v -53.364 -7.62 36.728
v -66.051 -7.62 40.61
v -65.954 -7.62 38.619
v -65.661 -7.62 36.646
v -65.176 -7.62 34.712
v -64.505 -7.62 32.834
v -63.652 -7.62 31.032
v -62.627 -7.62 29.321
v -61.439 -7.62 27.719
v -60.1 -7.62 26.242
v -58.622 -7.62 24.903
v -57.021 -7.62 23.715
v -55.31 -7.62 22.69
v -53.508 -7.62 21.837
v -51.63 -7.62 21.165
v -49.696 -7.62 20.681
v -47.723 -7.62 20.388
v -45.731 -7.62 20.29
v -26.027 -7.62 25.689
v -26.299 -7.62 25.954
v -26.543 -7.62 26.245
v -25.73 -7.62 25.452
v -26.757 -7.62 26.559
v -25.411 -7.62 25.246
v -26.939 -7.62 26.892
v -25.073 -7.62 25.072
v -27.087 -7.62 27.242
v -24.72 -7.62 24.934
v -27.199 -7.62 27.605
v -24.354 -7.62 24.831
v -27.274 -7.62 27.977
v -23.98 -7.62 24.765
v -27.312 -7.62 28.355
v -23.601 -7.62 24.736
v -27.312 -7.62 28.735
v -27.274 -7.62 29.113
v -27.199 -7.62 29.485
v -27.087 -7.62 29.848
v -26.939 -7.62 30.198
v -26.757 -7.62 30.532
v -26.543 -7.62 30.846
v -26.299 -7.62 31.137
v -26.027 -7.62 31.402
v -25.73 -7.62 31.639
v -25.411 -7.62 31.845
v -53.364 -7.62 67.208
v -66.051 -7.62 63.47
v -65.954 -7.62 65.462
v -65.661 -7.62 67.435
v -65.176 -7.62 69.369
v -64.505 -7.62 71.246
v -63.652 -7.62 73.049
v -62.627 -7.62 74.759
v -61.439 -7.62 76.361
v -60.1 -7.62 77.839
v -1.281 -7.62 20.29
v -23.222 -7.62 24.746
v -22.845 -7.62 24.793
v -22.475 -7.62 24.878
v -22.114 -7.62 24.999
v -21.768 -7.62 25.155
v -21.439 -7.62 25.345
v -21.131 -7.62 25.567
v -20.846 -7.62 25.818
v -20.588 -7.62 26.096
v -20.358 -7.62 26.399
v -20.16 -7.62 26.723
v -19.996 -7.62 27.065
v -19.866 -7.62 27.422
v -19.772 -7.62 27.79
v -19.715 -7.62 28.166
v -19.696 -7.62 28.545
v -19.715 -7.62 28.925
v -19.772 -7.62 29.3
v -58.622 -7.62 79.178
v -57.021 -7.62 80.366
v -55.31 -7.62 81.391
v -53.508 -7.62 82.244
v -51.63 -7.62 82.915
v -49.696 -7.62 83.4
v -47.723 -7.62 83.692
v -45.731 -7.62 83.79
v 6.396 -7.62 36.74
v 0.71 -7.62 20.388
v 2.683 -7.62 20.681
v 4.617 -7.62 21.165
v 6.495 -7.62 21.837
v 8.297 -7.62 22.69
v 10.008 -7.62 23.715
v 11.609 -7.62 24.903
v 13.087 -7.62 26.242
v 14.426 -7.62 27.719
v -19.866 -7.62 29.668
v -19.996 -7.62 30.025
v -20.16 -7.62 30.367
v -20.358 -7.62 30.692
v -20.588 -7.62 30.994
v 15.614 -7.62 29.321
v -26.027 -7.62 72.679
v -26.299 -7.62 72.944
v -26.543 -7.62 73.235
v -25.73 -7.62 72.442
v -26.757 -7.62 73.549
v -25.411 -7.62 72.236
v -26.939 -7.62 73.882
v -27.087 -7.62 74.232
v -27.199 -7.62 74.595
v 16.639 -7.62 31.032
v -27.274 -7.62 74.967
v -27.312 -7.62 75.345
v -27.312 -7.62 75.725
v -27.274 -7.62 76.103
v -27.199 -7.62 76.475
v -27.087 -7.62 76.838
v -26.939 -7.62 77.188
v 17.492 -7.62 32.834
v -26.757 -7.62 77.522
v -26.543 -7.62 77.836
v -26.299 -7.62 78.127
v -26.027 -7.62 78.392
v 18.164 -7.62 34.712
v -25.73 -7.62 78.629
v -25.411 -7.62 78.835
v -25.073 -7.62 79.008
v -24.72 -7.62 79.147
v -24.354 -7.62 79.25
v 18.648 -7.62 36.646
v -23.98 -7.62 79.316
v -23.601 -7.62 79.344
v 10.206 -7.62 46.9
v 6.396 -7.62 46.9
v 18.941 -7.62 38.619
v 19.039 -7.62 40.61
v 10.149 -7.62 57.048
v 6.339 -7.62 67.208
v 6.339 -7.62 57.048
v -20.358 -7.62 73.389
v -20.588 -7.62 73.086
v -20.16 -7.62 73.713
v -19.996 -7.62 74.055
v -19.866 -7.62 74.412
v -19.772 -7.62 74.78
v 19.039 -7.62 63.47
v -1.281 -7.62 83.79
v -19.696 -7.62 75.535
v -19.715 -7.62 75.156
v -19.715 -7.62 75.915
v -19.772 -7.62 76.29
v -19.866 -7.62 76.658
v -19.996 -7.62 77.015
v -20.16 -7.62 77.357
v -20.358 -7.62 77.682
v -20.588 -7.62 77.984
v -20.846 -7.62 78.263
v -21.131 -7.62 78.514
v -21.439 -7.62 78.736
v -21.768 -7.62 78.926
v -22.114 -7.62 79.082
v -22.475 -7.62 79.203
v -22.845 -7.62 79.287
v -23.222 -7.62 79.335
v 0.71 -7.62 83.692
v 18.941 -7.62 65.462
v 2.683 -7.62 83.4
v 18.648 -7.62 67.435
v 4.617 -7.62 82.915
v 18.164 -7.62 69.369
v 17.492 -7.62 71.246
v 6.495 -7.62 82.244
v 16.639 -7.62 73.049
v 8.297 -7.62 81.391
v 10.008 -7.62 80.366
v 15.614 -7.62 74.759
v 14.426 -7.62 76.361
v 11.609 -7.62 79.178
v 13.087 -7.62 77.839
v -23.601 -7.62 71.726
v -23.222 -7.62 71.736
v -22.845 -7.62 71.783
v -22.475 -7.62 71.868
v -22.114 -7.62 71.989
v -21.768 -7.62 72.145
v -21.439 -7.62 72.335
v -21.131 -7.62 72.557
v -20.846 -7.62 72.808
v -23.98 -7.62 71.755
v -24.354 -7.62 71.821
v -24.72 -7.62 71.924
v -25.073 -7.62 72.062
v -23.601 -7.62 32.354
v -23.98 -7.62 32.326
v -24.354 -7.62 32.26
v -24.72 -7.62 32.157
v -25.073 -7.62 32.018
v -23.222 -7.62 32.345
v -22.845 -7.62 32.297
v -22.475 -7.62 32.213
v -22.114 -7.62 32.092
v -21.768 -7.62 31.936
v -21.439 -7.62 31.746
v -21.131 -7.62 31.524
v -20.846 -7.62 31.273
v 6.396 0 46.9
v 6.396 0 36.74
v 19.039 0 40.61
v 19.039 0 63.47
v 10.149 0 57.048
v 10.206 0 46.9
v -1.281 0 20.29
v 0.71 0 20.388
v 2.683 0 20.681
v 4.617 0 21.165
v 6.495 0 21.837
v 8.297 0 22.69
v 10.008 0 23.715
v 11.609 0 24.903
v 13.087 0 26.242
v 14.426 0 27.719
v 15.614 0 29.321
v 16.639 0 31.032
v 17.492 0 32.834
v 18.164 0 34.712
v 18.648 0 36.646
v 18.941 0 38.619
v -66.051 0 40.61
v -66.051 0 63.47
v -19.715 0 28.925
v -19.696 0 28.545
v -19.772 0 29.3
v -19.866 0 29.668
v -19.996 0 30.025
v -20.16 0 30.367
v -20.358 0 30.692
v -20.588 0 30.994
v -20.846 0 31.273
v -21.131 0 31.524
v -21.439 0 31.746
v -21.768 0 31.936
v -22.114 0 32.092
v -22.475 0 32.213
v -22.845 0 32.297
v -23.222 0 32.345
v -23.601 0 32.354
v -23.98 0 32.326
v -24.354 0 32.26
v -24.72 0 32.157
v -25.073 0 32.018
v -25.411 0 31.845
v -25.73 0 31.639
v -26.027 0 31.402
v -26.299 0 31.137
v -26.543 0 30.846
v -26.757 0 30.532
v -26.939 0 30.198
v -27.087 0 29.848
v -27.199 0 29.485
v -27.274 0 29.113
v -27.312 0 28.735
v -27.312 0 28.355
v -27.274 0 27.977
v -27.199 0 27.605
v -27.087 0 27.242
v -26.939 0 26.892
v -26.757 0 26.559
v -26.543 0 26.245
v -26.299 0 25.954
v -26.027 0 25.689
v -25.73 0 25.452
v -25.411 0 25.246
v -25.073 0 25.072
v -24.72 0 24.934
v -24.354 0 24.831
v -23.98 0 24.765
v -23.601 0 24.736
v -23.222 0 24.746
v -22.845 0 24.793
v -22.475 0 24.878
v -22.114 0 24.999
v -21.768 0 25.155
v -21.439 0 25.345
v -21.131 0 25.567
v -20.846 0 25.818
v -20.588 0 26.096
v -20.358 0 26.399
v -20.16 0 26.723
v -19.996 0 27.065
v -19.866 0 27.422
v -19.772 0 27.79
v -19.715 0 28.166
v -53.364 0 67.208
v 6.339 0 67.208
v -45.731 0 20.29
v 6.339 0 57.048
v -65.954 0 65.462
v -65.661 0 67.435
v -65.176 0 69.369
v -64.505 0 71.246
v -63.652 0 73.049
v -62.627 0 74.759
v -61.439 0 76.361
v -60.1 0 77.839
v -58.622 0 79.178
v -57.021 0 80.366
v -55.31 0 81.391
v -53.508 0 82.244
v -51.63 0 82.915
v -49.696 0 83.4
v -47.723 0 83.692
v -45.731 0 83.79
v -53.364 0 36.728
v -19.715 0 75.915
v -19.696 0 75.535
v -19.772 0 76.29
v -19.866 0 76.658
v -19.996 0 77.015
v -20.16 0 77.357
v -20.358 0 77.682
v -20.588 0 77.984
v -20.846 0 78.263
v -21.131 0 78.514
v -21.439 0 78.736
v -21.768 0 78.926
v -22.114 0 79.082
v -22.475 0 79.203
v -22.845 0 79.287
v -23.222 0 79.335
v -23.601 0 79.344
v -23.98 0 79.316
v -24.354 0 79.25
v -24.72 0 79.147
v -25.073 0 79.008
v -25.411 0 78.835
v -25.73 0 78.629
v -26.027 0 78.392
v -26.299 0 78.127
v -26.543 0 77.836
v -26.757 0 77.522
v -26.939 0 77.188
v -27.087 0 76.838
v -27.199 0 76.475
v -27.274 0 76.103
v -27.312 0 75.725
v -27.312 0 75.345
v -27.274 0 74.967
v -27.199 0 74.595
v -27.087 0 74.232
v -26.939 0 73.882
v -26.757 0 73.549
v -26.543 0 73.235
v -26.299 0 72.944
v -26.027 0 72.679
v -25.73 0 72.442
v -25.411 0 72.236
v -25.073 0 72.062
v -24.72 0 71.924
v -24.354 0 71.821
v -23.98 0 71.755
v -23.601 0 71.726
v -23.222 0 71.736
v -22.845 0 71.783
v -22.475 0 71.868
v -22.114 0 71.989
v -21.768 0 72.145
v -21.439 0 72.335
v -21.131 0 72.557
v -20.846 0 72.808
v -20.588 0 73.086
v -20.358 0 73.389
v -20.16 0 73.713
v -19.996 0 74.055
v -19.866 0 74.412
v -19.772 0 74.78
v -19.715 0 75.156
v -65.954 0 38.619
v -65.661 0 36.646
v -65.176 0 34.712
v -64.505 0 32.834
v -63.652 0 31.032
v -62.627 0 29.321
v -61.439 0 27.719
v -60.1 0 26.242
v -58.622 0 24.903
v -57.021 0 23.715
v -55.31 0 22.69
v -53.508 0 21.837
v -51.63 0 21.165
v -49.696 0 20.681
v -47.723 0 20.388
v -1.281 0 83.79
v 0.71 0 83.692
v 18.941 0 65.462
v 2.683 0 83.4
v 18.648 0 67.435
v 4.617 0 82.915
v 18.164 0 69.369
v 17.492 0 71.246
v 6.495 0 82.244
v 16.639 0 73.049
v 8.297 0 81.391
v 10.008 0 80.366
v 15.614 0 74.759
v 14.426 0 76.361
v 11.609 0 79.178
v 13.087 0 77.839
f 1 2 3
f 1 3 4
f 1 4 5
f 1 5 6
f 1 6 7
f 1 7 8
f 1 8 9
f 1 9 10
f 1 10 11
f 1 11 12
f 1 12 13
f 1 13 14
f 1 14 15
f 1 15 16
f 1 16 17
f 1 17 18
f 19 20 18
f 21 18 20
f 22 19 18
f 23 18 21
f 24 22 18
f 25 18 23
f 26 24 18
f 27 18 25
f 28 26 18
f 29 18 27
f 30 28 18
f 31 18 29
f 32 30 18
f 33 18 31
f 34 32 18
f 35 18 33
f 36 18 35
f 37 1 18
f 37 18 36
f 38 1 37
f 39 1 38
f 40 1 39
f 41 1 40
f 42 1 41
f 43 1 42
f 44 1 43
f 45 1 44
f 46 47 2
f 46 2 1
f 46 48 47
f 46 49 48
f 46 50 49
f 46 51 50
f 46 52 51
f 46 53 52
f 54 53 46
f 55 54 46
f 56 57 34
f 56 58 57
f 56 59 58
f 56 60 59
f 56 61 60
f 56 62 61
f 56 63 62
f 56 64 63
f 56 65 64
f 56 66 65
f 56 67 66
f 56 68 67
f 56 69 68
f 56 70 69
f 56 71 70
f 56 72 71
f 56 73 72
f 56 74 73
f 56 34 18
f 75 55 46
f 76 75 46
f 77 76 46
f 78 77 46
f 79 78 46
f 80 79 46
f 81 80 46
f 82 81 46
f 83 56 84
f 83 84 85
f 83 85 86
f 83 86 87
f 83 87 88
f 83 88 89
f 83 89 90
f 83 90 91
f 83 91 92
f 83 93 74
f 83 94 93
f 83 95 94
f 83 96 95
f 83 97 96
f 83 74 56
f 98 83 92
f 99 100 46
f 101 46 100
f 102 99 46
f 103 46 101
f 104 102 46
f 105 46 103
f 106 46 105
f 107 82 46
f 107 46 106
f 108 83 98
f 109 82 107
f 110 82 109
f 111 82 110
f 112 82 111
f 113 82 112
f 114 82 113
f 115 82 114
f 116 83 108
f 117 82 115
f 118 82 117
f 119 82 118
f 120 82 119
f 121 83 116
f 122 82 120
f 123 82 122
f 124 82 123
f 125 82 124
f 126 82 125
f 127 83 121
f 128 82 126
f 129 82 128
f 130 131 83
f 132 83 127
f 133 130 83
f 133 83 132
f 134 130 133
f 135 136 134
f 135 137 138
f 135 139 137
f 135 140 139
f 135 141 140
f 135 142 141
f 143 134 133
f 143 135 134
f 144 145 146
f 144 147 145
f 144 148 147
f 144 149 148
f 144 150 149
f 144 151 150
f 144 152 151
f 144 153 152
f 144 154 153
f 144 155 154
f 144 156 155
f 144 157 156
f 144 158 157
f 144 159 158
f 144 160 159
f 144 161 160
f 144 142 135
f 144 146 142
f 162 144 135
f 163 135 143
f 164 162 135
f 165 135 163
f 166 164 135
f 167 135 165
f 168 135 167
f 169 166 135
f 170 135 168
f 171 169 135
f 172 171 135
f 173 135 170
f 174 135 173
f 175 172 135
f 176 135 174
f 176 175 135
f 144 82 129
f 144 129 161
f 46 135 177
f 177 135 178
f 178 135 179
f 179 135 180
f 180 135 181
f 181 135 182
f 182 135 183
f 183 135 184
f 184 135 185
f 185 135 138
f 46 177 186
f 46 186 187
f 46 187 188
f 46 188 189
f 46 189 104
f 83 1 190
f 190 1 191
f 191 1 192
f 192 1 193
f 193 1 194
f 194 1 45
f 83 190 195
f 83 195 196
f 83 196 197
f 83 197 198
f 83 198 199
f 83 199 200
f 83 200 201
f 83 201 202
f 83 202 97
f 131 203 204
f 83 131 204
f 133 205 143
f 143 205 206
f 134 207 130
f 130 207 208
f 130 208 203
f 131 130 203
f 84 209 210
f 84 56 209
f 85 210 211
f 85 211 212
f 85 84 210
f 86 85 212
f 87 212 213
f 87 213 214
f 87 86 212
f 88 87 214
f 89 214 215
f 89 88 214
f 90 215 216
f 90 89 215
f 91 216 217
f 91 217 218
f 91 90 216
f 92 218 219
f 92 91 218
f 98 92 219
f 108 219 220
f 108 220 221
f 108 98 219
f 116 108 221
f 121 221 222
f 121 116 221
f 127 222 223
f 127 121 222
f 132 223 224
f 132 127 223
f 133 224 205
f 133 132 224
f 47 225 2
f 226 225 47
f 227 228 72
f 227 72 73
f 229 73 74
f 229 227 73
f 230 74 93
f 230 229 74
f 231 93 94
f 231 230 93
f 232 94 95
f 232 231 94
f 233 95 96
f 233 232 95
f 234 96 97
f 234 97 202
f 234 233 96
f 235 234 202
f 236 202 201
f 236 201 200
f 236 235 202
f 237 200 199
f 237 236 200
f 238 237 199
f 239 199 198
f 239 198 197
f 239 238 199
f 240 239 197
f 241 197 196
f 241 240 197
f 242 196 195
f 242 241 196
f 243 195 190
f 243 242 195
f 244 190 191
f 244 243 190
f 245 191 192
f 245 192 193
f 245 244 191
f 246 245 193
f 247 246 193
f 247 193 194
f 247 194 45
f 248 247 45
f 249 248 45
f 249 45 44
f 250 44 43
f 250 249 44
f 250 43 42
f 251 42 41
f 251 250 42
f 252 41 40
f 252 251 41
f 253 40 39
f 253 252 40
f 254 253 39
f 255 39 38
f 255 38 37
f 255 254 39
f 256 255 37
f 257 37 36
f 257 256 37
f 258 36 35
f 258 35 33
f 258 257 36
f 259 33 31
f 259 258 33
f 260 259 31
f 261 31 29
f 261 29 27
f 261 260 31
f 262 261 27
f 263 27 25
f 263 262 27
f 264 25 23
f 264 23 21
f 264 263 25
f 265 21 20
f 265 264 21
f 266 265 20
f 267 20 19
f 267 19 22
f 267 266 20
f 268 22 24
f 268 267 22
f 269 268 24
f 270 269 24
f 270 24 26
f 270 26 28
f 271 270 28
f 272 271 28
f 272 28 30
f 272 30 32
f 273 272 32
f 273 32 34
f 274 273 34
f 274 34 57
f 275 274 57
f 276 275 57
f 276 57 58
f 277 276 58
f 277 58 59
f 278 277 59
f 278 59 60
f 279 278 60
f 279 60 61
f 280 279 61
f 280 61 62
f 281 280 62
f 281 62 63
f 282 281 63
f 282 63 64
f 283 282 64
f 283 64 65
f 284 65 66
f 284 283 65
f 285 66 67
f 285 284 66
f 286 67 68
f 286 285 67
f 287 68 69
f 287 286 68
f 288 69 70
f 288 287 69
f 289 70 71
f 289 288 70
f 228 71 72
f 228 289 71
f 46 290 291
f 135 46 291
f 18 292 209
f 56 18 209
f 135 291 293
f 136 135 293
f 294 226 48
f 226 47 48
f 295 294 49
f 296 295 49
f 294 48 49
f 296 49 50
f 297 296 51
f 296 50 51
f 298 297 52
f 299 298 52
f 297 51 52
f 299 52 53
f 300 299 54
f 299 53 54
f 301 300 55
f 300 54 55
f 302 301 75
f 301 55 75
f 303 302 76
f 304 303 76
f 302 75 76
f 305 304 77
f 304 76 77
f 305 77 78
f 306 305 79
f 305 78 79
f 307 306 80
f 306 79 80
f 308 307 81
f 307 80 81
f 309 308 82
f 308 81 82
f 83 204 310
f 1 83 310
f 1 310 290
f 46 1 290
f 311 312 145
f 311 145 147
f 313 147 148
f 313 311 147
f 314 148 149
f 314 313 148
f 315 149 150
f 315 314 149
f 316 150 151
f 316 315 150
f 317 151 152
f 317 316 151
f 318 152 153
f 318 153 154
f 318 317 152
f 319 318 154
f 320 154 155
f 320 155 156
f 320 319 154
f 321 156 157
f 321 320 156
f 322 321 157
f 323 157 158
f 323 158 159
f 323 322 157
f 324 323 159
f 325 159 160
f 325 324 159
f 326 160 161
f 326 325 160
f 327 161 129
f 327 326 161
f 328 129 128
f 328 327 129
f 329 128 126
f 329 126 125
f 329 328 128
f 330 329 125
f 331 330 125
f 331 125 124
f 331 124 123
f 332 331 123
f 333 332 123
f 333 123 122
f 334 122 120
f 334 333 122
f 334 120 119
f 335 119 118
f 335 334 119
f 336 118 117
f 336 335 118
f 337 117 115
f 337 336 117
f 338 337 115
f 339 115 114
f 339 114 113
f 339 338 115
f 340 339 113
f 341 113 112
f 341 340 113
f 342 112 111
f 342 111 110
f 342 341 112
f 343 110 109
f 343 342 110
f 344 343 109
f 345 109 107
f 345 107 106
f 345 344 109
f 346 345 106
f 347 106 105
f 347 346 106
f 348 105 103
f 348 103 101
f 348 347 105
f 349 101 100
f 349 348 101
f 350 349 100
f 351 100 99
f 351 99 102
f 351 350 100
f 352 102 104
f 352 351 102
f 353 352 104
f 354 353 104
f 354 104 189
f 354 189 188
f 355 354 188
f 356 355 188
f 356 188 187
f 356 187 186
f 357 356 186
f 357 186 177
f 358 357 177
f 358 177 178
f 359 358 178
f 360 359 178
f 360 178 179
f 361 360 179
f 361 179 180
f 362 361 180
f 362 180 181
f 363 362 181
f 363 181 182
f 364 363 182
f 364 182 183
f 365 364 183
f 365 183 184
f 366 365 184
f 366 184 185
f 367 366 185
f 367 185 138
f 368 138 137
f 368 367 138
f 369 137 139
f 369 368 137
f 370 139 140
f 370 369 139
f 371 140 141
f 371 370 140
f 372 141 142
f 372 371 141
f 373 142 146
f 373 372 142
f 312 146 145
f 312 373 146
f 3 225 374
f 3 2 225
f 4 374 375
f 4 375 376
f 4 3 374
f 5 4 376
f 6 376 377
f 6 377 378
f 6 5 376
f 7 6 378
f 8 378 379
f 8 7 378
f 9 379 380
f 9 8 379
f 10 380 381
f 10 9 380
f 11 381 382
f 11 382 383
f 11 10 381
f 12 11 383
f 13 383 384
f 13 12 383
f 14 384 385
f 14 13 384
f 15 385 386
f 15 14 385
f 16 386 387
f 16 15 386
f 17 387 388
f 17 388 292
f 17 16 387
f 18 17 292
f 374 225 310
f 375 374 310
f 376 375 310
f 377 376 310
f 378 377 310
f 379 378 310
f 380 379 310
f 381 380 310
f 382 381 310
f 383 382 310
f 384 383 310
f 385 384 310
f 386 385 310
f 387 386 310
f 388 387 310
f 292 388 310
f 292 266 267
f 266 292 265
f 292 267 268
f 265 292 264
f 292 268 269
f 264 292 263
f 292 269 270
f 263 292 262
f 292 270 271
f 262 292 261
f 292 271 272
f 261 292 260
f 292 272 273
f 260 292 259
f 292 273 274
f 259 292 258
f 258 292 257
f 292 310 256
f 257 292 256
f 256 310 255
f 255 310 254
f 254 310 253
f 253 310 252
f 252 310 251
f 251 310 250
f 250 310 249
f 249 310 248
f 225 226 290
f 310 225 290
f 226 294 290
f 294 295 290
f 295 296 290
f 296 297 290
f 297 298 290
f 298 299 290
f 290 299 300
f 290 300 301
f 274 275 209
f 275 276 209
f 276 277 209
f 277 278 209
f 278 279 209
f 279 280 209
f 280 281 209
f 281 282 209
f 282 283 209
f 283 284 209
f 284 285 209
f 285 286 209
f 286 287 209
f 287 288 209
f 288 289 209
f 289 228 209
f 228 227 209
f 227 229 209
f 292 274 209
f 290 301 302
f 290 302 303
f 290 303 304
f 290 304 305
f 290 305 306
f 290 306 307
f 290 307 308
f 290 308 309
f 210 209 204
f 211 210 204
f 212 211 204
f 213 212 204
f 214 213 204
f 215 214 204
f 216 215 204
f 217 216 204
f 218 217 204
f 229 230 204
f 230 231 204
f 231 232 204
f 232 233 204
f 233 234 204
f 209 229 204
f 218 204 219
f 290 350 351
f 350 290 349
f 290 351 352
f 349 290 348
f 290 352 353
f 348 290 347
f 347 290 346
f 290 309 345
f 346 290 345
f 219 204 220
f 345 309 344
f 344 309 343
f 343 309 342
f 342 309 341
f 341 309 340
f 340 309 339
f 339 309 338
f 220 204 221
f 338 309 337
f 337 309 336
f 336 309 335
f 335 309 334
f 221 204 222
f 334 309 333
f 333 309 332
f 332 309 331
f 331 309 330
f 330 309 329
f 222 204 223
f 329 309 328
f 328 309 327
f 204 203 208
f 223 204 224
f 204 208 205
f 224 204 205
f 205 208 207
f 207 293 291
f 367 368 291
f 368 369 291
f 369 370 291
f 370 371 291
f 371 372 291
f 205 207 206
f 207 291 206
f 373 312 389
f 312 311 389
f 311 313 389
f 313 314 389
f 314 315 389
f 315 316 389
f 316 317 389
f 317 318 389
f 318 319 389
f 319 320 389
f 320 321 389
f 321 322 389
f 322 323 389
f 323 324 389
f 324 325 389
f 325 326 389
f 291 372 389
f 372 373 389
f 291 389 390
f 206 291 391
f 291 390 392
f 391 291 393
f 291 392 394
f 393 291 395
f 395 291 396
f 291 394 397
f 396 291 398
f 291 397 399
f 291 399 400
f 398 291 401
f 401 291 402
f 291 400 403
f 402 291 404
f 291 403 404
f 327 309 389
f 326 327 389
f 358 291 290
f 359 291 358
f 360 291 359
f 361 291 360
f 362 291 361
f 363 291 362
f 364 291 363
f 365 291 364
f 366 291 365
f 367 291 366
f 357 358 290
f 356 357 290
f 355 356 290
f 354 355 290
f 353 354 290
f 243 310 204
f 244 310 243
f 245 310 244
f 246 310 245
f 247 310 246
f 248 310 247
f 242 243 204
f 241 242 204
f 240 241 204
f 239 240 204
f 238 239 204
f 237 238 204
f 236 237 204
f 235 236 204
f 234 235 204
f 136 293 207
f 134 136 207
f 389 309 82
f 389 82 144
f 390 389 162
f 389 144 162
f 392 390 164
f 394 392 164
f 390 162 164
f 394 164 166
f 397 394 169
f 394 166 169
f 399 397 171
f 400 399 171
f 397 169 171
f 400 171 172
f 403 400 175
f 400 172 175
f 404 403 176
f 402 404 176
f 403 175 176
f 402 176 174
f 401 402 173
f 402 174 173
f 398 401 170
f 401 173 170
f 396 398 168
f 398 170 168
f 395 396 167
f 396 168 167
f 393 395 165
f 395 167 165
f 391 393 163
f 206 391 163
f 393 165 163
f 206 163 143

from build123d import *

# Parameters (mm, degrees)
F0_W     = 85.09
F0_H     = 63.5
F0_R     = 3.81
F1_DEPTH = 7.62
F2_R     = 20.32


with BuildPart() as f1:
    # F0 (on Front) → F1 (new body)
    with BuildSketch(Plane.XZ):
        with Locations((-23.506424, 52.040306)):
            Rectangle(F0_W, F0_H)
        with Locations((-23.506424, 28.545306)):
            Circle(F0_R, mode=Mode.SUBTRACT)
        Polygon((-53.364091, 67.207848), (-42.140279, 67.207848), (6.338576, 67.207848), (6.338576, 57.047848), (10.148576, 57.047848), (10.206486, 46.900329), (6.396486, 46.900329), (6.396486, 36.740329), (-53.364091, 36.727848), align=None, mode=Mode.SUBTRACT)
        with Locations((-23.506424, 75.535306)):
            Circle(F0_R, mode=Mode.SUBTRACT)
    extrude(amount=F1_DEPTH)

    # F2
    f2_edges = [f1.edges().sort_by_distance(p)[0] for p in [
        (-66.051424, -3.81, 83.790306),
        (-66.051424, -3.81, 20.290306),
        (19.038576, -3.81, 20.290306),
        (19.038576, -3.81, 83.790306),
    ]]
    fillet(f2_edges, radius=F2_R)


solid = f1.part
